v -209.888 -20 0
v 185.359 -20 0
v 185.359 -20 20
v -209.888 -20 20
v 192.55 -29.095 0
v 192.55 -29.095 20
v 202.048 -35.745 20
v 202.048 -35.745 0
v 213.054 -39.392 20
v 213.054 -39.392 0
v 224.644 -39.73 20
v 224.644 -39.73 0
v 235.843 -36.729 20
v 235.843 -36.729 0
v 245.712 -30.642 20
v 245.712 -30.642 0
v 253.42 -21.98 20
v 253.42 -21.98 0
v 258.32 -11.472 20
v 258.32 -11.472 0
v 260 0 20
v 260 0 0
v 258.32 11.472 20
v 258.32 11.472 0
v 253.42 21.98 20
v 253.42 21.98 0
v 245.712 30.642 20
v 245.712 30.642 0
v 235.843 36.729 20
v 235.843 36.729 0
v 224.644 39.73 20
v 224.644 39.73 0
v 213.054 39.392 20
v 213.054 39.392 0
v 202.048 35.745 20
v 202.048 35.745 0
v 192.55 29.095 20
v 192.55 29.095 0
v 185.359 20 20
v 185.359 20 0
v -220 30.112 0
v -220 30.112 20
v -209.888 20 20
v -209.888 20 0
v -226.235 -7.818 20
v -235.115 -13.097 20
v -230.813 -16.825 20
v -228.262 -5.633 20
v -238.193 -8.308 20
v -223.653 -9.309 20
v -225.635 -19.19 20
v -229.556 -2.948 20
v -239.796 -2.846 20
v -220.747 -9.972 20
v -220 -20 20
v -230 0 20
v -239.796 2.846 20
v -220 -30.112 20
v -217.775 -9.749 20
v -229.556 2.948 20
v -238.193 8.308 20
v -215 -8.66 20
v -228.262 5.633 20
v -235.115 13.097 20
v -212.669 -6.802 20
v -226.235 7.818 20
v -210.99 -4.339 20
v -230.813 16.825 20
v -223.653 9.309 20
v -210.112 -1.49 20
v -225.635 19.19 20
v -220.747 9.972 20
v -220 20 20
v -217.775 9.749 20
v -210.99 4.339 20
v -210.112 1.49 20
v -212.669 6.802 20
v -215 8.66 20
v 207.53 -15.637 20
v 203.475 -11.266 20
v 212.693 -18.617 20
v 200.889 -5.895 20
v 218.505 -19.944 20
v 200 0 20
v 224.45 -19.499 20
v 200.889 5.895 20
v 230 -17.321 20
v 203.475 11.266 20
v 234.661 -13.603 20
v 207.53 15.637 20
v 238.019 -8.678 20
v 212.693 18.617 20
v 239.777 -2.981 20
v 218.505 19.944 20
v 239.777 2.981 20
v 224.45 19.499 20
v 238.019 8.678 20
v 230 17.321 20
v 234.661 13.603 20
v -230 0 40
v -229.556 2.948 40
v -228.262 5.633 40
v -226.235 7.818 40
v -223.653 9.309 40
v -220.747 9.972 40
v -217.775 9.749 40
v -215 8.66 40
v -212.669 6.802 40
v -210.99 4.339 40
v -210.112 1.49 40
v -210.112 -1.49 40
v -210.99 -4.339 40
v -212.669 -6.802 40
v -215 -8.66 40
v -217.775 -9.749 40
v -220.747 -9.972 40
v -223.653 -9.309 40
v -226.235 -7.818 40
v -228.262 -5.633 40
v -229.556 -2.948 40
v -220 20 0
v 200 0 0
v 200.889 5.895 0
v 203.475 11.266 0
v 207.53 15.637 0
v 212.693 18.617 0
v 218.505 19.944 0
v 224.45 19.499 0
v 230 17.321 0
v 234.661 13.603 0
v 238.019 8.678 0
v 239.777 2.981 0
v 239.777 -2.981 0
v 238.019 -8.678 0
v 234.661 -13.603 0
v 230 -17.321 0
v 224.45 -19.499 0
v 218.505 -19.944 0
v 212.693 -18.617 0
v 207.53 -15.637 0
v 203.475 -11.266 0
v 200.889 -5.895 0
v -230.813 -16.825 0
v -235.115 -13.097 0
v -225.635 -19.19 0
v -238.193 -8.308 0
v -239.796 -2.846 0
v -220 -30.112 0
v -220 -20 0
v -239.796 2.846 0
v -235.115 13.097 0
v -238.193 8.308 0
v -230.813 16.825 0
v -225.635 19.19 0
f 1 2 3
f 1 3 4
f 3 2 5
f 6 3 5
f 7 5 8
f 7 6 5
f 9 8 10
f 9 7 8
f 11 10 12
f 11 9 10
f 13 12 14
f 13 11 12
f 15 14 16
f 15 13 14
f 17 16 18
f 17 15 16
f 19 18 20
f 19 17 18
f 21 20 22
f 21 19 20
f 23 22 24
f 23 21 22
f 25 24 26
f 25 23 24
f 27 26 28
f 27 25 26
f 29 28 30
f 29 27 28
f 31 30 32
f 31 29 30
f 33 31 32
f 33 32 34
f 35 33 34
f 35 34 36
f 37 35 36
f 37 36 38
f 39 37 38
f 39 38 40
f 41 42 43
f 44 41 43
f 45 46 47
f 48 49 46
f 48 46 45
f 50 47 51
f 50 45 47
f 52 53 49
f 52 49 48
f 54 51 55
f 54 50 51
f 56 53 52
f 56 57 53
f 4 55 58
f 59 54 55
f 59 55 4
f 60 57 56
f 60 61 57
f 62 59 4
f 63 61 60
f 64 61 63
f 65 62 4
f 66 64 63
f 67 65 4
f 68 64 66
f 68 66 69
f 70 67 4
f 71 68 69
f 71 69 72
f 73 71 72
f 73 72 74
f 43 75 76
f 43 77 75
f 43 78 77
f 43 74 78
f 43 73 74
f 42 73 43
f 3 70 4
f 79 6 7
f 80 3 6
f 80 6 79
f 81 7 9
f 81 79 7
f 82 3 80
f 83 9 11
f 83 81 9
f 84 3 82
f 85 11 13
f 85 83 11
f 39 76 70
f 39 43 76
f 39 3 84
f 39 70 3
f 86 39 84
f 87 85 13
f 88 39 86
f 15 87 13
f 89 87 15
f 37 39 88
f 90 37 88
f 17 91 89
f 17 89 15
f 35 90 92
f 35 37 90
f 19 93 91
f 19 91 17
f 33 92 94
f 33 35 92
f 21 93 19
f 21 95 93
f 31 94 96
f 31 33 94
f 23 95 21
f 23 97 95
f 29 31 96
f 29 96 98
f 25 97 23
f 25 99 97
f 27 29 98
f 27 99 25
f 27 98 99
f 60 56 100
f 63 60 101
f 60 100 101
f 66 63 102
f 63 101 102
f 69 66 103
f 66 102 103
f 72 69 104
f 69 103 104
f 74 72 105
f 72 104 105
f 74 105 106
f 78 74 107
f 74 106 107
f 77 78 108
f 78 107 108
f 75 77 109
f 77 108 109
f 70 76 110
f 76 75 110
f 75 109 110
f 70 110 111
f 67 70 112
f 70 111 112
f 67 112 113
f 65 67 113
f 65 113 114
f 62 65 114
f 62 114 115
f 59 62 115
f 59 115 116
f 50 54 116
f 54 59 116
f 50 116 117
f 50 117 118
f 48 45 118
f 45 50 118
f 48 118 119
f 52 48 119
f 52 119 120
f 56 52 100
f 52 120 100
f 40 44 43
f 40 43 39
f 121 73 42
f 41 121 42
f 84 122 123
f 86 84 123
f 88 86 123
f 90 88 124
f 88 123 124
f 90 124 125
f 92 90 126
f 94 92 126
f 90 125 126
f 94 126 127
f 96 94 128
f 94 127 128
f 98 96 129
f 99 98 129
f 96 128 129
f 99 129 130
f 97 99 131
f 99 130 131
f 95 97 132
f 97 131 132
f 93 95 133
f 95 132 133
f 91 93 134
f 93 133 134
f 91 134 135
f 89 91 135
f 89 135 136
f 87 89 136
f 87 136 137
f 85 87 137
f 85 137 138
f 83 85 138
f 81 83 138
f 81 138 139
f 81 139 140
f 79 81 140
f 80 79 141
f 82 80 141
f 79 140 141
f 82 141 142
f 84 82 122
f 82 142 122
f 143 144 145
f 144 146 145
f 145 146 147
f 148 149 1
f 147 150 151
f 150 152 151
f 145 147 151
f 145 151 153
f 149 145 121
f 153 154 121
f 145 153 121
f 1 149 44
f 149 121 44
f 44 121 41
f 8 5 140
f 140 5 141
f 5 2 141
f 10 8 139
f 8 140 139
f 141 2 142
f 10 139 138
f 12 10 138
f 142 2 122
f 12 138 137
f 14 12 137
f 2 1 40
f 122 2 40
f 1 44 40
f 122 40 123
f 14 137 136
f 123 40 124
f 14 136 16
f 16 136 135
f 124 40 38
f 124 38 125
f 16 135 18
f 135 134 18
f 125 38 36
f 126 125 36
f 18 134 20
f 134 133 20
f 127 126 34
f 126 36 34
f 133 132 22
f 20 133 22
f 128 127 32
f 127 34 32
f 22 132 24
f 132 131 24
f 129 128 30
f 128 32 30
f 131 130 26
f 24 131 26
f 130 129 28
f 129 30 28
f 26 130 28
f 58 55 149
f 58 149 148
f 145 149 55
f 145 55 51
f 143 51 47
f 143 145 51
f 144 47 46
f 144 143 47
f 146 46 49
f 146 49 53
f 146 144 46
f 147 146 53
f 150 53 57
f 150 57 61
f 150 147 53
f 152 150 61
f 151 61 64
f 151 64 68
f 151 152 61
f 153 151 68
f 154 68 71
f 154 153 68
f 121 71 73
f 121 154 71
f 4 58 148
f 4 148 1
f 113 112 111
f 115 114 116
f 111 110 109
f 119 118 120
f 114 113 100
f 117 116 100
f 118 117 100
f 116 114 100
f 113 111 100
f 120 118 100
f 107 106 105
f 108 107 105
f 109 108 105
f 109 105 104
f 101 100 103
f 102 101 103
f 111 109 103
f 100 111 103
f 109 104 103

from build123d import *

# Parameters (mm, degrees)
BOSS_EXTRUDE1_DEPTH    = 20
SKETCH2_R              = 10
CUT_EXTRUDE1_DEPTH     = 20
SPUR_START             = 143.992112376
SPUR_GEAR_AM_OUTLINE_R = 5
SPUR_GEAR_AM_DEPTH     = 10
SKETCH4_R              = 40
BOSS_EXTRUDE2_DEPTH    = 20
BOSS_EXTRUDE3_DEPTH    = 20
SKETCH5_R              = 20
CUT_EXTRUDE4_DEPTH     = 20
BOSS_EXTRUDE4_START    = -40
SKETCH8_R              = 10
BOSS_EXTRUDE4_DEPTH    = 40


# Read off the part's stored shape, not the designer's step: spur gear_am
with BuildPart() as part:
    # Sketch1 → Boss-Extrude1 (new body)
    with BuildSketch(Plane.XY):
        with BuildLine():
            Line((-220, 20), (220, 20))
            ThreePointArc((220, 20), (240, 0), (220, -20))
            Line((220, -20), (-220, -20))
            ThreePointArc((-220, -20), (-240, 0), (-220, 20))
        make_face()
    extrude(amount=BOSS_EXTRUDE1_DEPTH)

    # Sketch2 → Cut-Extrude1 (cut)
    with BuildSketch(Plane.XY.offset(20)):
        with Locations((220, 0)):
            Circle(SKETCH2_R)
        with Locations((-220, 0)):
            Circle(SKETCH2_R)
    extrude(amount=-CUT_EXTRUDE1_DEPTH, mode=Mode.SUBTRACT)

    # Sketch4 → Boss-Extrude2 (add)
    with BuildSketch(Plane.XY.offset(20)):
        with Locations((220, 0)):
            Circle(SKETCH4_R)
    extrude(amount=-BOSS_EXTRUDE2_DEPTH)

    # Sketch6 → Boss-Extrude3 (add)
    with BuildSketch(Plane.XY.offset(20)):
        Polygon((-220, -20), (-220, -30.112160349), (-209.887839651, -20), align=None)
        Polygon((-209.887839651, 20), (-220, 20), (-220, 30.112160349), align=None)
    extrude(amount=-BOSS_EXTRUDE3_DEPTH)

    # Sketch5 → Cut-Extrude4 (cut)
    with BuildSketch(Plane(origin=(0, 0, 0), x_dir=(-1, 0, 0), z_dir=(0, 0, -1))):
        with Locations((-220, 0)):
            Circle(SKETCH5_R)
    extrude(amount=-CUT_EXTRUDE4_DEPTH, mode=Mode.SUBTRACT)

    # Sketch8 → Boss-Extrude4 (add)
    with BuildSketch(Plane(origin=(0, 0, 0), x_dir=(-1, 0, 0), z_dir=(0, 0, -1)).offset(BOSS_EXTRUDE4_START)):
        with Locations((220, 0)):
            Circle(SKETCH8_R)
    extrude(amount=BOSS_EXTRUDE4_DEPTH)


with BuildPart() as body_2:
    # spur gear_am outline → spur gear_am (new body)
    with BuildSketch(Plane.YZ.offset(SPUR_START)):
        with BuildLine():
            ThreePointArc((13.133221577, -371.123184299), (13.390101578, -371.125934087), (13.646981578, -371.123184299))
            ThreePointArc((13.646981578, -371.123184299), (14.846401327, -368.975865304), (14.562642986, -366.532697728))
            ThreePointArc((14.562642986, -366.532697728), (15.707420018, -366.257906902), (16.795082087, -365.807334294))
            ThreePointArc((16.795082087, -365.807334294), (18.001574637, -367.950687351), (20.234088035, -368.982903671))
            ThreePointArc((20.234088035, -368.982903671), (20.443524605, -368.834138019), (20.649728607, -368.680923118))
            ThreePointArc((20.649728607, -368.680923118), (20.35791713, -366.238704319), (18.69229394, -364.428929198))
            ThreePointArc((18.69229394, -364.428929198), (19.456920018, -363.533735693), (20.072017182, -362.529903073))
            ThreePointArc((20.072017182, -362.529903073), (22.307921476, -363.554753593), (24.720784284, -363.077595687))
            ThreePointArc((24.720784284, -363.077595687), (24.802779773, -362.834138019), (24.879544856, -362.588980889))
            ThreePointArc((24.879544856, -362.588980889), (23.207964219, -360.78470686), (20.796687626, -360.299596778))
            ThreePointArc((20.796687626, -360.299596778), (20.889101578, -359.125934087), (20.796687626, -357.952271396))
            ThreePointArc((20.796687626, -357.952271396), (23.207964219, -357.467161313), (24.879544856, -355.662887284))
            ThreePointArc((24.879544856, -355.662887284), (24.802779773, -355.417730154), (24.720784284, -355.174272487))
            ThreePointArc((24.720784284, -355.174272487), (22.307921476, -354.697114581), (20.072017182, -355.7219651))
            ThreePointArc((20.072017182, -355.7219651), (19.456920018, -354.71813248), (18.69229394, -353.822938975))
            ThreePointArc((18.69229394, -353.822938975), (20.35791713, -352.013163854), (20.649728607, -349.570945055))
            ThreePointArc((20.649728607, -349.570945055), (20.443524605, -349.417730154), (20.234088035, -349.268964503))
            ThreePointArc((20.234088035, -349.268964503), (18.001574638, -350.301180822), (16.795082087, -352.444533879))
            ThreePointArc((16.795082087, -352.444533879), (15.707420018, -351.993961271), (14.562642986, -351.719170445))
            ThreePointArc((14.562642986, -351.719170445), (14.846401327, -349.276002869), (13.646981578, -347.128683874))
            ThreePointArc((13.646981578, -347.128683874), (13.390101577, -347.125934087), (13.133221577, -347.128683874))
            ThreePointArc((13.133221577, -347.128683874), (11.933801828, -349.276002869), (12.217560169, -351.719170445))
            ThreePointArc((12.217560169, -351.719170445), (11.072783137, -351.993961271), (9.985121068, -352.444533879))
            ThreePointArc((9.985121068, -352.444533879), (8.778628518, -350.301180823), (6.546115121, -349.268964503))
            ThreePointArc((6.546115121, -349.268964503), (6.33667855, -349.417730154), (6.130474548, -349.570945055))
            ThreePointArc((6.130474548, -349.570945055), (6.422286026, -352.013163854), (8.087909215, -353.822938975))
            ThreePointArc((8.087909215, -353.822938975), (7.323283137, -354.71813248), (6.708185973, -355.7219651))
            ThreePointArc((6.708185973, -355.7219651), (4.472281679, -354.697114581), (2.059418871, -355.174272487))
            ThreePointArc((2.059418871, -355.174272487), (1.977423382, -355.417730154), (1.900658299, -355.662887284))
            ThreePointArc((1.900658299, -355.662887284), (3.572238937, -357.467161313), (5.98351553, -357.952271396))
            ThreePointArc((5.98351553, -357.952271396), (5.891101578, -359.125934087), (5.98351553, -360.299596778))
            ThreePointArc((5.98351553, -360.299596778), (3.572238937, -360.78470686), (1.900658299, -362.588980889))
            ThreePointArc((1.900658299, -362.588980889), (1.977423382, -362.834138019), (2.059418871, -363.077595687))
            ThreePointArc((2.059418871, -363.077595687), (4.472281679, -363.554753593), (6.708185973, -362.529903073))
            ThreePointArc((6.708185973, -362.529903073), (7.323283137, -363.533735693), (8.087909215, -364.428929198))
            ThreePointArc((8.087909215, -364.428929198), (6.422286026, -366.23870432), (6.130474548, -368.680923118))
            ThreePointArc((6.130474548, -368.680923118), (6.33667855, -368.834138019), (6.546115121, -368.982903671))
            ThreePointArc((6.546115121, -368.982903671), (8.778628518, -367.950687351), (9.985121068, -365.807334294))
            ThreePointArc((9.985121068, -365.807334294), (11.072783137, -366.257906902), (12.217560169, -366.532697728))
            ThreePointArc((12.217560169, -366.532697728), (11.933801828, -368.975865304), (13.133221577, -371.123184299))
        make_face()
        with Locations((13.390101578, -359.125934087)):
            Circle(SPUR_GEAR_AM_OUTLINE_R, mode=Mode.SUBTRACT)
    extrude(amount=SPUR_GEAR_AM_DEPTH)


solid = part.part
